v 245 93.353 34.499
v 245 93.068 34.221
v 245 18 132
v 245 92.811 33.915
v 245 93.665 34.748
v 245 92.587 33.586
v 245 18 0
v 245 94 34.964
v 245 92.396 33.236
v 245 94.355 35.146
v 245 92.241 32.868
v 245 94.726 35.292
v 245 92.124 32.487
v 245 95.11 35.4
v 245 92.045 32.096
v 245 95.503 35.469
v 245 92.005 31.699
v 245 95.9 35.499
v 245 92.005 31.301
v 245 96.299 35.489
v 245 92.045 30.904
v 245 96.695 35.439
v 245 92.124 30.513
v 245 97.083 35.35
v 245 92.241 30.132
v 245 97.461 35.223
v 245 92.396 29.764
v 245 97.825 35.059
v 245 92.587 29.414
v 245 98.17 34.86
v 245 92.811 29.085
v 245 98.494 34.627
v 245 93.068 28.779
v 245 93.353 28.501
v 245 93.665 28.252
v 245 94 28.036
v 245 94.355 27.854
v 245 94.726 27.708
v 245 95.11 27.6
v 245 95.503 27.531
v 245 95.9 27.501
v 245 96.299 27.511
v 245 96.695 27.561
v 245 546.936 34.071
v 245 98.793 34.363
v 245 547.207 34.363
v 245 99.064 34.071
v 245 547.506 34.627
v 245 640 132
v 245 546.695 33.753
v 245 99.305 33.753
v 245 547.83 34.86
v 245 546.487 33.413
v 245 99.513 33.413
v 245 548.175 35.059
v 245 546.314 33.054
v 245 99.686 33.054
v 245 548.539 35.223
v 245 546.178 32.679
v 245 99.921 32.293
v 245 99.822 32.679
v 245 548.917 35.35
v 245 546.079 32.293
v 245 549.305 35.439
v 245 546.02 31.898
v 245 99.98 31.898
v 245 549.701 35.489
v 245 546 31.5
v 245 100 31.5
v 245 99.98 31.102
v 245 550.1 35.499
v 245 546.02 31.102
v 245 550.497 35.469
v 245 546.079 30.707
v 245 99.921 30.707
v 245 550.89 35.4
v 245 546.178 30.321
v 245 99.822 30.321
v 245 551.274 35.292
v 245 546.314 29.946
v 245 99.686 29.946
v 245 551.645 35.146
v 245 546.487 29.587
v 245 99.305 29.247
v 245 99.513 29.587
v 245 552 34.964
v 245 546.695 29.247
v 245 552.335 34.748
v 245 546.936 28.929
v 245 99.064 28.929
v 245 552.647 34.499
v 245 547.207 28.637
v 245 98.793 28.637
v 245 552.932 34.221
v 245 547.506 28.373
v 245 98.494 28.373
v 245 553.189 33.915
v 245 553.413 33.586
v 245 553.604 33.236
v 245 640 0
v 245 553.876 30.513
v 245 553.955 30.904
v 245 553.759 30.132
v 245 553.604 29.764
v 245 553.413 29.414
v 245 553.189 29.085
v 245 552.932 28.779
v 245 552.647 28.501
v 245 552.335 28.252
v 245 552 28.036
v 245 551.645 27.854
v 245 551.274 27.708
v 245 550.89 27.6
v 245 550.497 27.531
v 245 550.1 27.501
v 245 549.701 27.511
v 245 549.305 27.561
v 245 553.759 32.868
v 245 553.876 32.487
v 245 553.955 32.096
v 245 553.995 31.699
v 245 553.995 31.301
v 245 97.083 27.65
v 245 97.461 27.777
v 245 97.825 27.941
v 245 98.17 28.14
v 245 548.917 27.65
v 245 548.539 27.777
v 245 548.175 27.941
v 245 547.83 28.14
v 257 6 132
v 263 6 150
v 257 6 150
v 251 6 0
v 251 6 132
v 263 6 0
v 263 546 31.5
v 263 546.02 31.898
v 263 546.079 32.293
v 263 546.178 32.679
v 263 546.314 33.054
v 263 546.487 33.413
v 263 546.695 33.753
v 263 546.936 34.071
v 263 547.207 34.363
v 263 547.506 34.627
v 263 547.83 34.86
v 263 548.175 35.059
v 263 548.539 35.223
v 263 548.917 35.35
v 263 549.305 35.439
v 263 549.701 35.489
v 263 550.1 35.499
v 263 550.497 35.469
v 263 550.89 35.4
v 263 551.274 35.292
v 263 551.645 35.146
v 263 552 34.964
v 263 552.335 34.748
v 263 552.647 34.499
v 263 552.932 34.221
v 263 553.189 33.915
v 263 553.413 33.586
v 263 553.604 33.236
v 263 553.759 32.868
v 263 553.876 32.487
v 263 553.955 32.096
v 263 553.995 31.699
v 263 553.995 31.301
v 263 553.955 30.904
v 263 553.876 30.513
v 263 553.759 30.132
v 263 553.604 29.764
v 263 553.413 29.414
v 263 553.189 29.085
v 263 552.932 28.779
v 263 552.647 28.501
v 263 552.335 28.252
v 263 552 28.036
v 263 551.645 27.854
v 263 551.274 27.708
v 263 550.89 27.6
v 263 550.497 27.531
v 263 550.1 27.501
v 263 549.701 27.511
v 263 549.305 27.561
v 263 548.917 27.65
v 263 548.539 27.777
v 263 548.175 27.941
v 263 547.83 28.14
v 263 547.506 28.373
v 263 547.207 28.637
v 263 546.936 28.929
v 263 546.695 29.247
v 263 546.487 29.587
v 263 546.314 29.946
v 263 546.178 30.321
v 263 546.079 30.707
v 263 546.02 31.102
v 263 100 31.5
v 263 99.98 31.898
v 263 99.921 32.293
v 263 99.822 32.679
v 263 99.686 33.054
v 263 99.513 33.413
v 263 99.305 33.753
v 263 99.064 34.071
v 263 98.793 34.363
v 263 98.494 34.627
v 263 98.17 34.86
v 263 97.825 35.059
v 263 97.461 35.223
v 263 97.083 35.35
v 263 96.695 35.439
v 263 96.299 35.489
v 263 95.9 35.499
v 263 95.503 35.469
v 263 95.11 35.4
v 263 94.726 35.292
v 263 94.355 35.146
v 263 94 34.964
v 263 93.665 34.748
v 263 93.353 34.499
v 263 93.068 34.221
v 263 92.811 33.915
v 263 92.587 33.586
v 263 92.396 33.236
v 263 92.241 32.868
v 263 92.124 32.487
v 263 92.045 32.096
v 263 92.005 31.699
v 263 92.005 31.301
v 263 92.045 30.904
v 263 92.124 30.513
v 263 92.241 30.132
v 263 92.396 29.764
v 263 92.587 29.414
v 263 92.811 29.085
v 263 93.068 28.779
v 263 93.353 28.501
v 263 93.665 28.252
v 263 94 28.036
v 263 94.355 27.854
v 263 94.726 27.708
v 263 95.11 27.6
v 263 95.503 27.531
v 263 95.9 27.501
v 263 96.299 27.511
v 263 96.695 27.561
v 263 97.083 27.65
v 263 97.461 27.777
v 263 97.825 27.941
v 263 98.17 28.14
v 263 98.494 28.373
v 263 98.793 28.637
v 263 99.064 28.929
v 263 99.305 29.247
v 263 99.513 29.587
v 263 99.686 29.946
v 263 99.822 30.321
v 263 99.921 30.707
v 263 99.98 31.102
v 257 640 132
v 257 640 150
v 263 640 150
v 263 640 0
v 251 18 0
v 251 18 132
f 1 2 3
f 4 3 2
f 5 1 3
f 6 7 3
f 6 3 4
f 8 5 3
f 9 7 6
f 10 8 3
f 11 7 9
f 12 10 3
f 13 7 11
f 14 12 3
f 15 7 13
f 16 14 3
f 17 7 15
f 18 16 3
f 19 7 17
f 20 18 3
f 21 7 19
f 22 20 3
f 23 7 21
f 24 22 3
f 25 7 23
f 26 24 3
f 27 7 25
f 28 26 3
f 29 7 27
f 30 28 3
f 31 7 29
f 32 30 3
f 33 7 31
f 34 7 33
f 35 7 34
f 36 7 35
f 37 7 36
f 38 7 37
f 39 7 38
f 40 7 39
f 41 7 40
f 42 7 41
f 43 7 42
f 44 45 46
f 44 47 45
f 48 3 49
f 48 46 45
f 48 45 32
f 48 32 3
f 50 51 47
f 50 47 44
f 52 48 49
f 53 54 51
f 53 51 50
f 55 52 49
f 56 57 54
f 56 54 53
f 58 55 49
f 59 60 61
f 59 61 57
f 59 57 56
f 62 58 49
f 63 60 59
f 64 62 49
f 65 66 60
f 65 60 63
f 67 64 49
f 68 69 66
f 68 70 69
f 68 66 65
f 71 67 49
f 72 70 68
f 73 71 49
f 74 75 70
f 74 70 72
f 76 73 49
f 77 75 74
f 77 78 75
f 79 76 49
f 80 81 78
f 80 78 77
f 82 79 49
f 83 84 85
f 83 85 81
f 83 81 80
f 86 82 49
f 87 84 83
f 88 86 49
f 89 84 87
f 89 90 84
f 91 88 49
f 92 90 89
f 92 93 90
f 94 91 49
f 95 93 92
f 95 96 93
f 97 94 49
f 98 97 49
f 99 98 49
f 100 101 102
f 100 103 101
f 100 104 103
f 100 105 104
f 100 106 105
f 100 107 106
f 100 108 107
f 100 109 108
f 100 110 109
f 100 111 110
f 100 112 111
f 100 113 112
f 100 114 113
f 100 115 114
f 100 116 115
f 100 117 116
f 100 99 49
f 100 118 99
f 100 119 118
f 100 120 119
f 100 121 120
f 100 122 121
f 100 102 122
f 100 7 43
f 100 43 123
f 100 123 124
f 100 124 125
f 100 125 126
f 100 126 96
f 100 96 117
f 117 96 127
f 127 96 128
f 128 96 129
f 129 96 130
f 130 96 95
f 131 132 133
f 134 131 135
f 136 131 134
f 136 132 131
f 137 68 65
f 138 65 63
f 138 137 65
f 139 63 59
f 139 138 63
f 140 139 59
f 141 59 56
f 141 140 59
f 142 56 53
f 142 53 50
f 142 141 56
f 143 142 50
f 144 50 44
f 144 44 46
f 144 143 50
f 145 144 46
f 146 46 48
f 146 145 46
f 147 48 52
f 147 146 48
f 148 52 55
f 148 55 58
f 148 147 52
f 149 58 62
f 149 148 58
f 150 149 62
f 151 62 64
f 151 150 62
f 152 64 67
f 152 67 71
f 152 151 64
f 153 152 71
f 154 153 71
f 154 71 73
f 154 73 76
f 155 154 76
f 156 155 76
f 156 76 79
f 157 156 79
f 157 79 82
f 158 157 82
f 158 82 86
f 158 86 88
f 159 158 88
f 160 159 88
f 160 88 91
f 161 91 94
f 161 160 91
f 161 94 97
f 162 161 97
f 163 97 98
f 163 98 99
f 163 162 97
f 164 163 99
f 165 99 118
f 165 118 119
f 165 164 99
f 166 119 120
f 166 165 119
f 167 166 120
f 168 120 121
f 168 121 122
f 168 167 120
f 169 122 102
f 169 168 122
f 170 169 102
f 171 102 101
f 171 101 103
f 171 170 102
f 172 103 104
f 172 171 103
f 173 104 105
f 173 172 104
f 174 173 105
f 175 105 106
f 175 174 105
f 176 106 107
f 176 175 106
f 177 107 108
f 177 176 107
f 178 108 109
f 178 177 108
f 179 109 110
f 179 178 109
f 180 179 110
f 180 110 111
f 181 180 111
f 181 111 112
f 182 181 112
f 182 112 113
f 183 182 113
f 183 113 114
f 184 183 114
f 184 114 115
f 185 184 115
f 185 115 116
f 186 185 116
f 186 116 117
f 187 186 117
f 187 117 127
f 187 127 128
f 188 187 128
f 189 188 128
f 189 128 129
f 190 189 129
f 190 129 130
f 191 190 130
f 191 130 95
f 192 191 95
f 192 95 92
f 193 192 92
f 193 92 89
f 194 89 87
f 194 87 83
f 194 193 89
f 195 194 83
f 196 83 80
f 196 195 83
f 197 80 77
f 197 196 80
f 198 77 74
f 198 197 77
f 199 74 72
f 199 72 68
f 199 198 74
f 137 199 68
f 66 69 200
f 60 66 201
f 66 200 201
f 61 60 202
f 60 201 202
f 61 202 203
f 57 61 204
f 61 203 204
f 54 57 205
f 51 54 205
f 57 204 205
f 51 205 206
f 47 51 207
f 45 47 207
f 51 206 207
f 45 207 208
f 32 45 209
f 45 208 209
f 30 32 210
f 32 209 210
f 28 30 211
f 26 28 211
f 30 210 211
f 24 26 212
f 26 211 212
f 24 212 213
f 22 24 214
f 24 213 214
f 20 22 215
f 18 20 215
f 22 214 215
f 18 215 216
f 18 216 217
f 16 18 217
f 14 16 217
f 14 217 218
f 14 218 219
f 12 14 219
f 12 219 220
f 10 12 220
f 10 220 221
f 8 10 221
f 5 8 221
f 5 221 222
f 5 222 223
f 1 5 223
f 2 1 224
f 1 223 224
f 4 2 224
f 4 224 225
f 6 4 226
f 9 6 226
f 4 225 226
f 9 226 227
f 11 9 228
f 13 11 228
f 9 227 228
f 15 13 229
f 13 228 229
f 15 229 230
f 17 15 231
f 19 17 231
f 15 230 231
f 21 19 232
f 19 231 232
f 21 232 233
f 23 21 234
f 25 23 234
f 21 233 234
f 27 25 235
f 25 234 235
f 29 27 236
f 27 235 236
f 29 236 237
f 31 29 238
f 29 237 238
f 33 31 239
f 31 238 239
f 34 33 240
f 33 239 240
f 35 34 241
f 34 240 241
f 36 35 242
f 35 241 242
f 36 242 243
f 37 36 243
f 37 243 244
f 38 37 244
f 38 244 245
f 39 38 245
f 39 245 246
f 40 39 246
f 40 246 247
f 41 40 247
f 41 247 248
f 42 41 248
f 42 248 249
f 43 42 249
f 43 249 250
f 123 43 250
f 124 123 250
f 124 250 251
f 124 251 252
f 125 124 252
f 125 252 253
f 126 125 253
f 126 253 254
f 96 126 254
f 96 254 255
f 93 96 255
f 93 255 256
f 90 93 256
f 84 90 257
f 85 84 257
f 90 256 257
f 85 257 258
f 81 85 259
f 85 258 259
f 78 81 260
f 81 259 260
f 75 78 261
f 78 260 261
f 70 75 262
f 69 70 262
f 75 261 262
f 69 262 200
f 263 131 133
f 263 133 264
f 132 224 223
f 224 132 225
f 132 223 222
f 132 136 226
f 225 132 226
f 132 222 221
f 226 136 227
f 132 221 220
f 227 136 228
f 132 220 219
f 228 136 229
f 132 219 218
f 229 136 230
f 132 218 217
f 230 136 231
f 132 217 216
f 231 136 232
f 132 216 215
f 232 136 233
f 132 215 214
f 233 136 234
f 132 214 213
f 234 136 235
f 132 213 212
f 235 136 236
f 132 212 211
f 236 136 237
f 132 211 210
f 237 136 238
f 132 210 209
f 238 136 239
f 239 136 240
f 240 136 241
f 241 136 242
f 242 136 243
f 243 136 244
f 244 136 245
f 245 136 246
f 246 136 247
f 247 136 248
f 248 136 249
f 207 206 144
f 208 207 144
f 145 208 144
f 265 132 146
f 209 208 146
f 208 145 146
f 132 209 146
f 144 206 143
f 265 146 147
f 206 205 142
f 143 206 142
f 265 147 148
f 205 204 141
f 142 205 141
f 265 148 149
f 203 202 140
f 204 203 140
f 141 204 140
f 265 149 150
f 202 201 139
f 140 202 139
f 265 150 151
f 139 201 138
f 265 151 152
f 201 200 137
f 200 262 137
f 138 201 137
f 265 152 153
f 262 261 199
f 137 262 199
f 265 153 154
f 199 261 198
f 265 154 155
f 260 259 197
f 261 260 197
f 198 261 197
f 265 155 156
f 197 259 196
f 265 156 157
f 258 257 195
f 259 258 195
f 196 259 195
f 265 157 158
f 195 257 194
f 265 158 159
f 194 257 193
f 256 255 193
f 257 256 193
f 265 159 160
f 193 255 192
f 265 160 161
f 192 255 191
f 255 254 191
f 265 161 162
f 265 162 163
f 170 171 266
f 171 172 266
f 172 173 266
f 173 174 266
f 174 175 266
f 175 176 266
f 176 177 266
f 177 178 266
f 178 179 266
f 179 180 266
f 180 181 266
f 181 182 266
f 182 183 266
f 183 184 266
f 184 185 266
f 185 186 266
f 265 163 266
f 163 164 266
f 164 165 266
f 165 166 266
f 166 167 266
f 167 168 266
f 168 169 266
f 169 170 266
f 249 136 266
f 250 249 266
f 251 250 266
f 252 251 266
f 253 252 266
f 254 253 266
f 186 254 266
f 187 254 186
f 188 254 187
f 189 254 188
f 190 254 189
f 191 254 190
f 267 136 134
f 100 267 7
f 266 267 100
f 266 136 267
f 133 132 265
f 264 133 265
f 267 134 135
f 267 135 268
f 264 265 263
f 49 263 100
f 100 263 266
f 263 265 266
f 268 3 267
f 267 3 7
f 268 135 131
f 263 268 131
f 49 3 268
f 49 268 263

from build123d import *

# Parameters (mm, degrees)
SKETCH032_W             = 634
SKETCH032_H             = 150
PAD012_DEPTH            = 18
SKETCH033_W             = 634
SKETCH033_H             = 18
POCKET020_DEPTH         = 12
SKETCH034_W             = 12
SKETCH034_H             = 150
POCKET021_DEPTH         = 6
SKETCH040_R             = 4
POCKET024_DEPTH         = 18
BODY011_ROLL_ANGLE      = -90
BODY011_PLACEMENT_ANGLE = 90


with BuildPart() as part:
    # Sketch032 → Pad012 (new body)
    with BuildSketch(Plane.XY):
        with Locations((0, 75)):
            Rectangle(SKETCH032_W, SKETCH032_H)
    extrude(amount=PAD012_DEPTH)

    # Sketch033 (on Face6 of Pad012) → Pocket020 (cut)
    with BuildSketch(Plane.XY.offset(18)):
        with Locations((0, 9)):
            Rectangle(SKETCH033_W, SKETCH033_H)
    extrude(amount=-POCKET020_DEPTH, mode=Mode.SUBTRACT)

    # Sketch034 (on Face5 of Pocket020) → Pocket021 (cut)
    with BuildSketch(Plane.XY.offset(18)):
        with Locations((-311, 75)):
            Rectangle(SKETCH034_W, SKETCH034_H)
    extrude(amount=-POCKET021_DEPTH, mode=Mode.SUBTRACT)

    # Sketch040 (on Face2 of Pocket021) → Pocket024 (cut)
    with BuildSketch(Plane(origin=(0, 0, 0), x_dir=(1, 0, 0), z_dir=(0, 0, -1))):
        with Locations((-227, -118.5)):
            Circle(SKETCH040_R)
    pocket024 = extrude(amount=-POCKET024_DEPTH, mode=Mode.SUBTRACT)

    # Mirrored009: Pocket024 across Sketch040 V_Axis
    add(pocket024.mirror(Plane(origin=(0, 0, 0), x_dir=(0, 0, -1), z_dir=(1, 0, 0))), mode=Mode.SUBTRACT)


with BuildPart() as part_1:
    # Body011 roll: moved
    add(part.part.rotate(Axis((0, 0, 0), (1, 0, 0)), BODY011_ROLL_ANGLE))


with BuildPart() as part_2:
    # Body011 placement: moved
    add(part_1.part.moved(Location((263, 323, 150))).rotate(Axis((263, 323, 150), (0, 0, 1)), BODY011_PLACEMENT_ANGLE))


solid = part_2.part
